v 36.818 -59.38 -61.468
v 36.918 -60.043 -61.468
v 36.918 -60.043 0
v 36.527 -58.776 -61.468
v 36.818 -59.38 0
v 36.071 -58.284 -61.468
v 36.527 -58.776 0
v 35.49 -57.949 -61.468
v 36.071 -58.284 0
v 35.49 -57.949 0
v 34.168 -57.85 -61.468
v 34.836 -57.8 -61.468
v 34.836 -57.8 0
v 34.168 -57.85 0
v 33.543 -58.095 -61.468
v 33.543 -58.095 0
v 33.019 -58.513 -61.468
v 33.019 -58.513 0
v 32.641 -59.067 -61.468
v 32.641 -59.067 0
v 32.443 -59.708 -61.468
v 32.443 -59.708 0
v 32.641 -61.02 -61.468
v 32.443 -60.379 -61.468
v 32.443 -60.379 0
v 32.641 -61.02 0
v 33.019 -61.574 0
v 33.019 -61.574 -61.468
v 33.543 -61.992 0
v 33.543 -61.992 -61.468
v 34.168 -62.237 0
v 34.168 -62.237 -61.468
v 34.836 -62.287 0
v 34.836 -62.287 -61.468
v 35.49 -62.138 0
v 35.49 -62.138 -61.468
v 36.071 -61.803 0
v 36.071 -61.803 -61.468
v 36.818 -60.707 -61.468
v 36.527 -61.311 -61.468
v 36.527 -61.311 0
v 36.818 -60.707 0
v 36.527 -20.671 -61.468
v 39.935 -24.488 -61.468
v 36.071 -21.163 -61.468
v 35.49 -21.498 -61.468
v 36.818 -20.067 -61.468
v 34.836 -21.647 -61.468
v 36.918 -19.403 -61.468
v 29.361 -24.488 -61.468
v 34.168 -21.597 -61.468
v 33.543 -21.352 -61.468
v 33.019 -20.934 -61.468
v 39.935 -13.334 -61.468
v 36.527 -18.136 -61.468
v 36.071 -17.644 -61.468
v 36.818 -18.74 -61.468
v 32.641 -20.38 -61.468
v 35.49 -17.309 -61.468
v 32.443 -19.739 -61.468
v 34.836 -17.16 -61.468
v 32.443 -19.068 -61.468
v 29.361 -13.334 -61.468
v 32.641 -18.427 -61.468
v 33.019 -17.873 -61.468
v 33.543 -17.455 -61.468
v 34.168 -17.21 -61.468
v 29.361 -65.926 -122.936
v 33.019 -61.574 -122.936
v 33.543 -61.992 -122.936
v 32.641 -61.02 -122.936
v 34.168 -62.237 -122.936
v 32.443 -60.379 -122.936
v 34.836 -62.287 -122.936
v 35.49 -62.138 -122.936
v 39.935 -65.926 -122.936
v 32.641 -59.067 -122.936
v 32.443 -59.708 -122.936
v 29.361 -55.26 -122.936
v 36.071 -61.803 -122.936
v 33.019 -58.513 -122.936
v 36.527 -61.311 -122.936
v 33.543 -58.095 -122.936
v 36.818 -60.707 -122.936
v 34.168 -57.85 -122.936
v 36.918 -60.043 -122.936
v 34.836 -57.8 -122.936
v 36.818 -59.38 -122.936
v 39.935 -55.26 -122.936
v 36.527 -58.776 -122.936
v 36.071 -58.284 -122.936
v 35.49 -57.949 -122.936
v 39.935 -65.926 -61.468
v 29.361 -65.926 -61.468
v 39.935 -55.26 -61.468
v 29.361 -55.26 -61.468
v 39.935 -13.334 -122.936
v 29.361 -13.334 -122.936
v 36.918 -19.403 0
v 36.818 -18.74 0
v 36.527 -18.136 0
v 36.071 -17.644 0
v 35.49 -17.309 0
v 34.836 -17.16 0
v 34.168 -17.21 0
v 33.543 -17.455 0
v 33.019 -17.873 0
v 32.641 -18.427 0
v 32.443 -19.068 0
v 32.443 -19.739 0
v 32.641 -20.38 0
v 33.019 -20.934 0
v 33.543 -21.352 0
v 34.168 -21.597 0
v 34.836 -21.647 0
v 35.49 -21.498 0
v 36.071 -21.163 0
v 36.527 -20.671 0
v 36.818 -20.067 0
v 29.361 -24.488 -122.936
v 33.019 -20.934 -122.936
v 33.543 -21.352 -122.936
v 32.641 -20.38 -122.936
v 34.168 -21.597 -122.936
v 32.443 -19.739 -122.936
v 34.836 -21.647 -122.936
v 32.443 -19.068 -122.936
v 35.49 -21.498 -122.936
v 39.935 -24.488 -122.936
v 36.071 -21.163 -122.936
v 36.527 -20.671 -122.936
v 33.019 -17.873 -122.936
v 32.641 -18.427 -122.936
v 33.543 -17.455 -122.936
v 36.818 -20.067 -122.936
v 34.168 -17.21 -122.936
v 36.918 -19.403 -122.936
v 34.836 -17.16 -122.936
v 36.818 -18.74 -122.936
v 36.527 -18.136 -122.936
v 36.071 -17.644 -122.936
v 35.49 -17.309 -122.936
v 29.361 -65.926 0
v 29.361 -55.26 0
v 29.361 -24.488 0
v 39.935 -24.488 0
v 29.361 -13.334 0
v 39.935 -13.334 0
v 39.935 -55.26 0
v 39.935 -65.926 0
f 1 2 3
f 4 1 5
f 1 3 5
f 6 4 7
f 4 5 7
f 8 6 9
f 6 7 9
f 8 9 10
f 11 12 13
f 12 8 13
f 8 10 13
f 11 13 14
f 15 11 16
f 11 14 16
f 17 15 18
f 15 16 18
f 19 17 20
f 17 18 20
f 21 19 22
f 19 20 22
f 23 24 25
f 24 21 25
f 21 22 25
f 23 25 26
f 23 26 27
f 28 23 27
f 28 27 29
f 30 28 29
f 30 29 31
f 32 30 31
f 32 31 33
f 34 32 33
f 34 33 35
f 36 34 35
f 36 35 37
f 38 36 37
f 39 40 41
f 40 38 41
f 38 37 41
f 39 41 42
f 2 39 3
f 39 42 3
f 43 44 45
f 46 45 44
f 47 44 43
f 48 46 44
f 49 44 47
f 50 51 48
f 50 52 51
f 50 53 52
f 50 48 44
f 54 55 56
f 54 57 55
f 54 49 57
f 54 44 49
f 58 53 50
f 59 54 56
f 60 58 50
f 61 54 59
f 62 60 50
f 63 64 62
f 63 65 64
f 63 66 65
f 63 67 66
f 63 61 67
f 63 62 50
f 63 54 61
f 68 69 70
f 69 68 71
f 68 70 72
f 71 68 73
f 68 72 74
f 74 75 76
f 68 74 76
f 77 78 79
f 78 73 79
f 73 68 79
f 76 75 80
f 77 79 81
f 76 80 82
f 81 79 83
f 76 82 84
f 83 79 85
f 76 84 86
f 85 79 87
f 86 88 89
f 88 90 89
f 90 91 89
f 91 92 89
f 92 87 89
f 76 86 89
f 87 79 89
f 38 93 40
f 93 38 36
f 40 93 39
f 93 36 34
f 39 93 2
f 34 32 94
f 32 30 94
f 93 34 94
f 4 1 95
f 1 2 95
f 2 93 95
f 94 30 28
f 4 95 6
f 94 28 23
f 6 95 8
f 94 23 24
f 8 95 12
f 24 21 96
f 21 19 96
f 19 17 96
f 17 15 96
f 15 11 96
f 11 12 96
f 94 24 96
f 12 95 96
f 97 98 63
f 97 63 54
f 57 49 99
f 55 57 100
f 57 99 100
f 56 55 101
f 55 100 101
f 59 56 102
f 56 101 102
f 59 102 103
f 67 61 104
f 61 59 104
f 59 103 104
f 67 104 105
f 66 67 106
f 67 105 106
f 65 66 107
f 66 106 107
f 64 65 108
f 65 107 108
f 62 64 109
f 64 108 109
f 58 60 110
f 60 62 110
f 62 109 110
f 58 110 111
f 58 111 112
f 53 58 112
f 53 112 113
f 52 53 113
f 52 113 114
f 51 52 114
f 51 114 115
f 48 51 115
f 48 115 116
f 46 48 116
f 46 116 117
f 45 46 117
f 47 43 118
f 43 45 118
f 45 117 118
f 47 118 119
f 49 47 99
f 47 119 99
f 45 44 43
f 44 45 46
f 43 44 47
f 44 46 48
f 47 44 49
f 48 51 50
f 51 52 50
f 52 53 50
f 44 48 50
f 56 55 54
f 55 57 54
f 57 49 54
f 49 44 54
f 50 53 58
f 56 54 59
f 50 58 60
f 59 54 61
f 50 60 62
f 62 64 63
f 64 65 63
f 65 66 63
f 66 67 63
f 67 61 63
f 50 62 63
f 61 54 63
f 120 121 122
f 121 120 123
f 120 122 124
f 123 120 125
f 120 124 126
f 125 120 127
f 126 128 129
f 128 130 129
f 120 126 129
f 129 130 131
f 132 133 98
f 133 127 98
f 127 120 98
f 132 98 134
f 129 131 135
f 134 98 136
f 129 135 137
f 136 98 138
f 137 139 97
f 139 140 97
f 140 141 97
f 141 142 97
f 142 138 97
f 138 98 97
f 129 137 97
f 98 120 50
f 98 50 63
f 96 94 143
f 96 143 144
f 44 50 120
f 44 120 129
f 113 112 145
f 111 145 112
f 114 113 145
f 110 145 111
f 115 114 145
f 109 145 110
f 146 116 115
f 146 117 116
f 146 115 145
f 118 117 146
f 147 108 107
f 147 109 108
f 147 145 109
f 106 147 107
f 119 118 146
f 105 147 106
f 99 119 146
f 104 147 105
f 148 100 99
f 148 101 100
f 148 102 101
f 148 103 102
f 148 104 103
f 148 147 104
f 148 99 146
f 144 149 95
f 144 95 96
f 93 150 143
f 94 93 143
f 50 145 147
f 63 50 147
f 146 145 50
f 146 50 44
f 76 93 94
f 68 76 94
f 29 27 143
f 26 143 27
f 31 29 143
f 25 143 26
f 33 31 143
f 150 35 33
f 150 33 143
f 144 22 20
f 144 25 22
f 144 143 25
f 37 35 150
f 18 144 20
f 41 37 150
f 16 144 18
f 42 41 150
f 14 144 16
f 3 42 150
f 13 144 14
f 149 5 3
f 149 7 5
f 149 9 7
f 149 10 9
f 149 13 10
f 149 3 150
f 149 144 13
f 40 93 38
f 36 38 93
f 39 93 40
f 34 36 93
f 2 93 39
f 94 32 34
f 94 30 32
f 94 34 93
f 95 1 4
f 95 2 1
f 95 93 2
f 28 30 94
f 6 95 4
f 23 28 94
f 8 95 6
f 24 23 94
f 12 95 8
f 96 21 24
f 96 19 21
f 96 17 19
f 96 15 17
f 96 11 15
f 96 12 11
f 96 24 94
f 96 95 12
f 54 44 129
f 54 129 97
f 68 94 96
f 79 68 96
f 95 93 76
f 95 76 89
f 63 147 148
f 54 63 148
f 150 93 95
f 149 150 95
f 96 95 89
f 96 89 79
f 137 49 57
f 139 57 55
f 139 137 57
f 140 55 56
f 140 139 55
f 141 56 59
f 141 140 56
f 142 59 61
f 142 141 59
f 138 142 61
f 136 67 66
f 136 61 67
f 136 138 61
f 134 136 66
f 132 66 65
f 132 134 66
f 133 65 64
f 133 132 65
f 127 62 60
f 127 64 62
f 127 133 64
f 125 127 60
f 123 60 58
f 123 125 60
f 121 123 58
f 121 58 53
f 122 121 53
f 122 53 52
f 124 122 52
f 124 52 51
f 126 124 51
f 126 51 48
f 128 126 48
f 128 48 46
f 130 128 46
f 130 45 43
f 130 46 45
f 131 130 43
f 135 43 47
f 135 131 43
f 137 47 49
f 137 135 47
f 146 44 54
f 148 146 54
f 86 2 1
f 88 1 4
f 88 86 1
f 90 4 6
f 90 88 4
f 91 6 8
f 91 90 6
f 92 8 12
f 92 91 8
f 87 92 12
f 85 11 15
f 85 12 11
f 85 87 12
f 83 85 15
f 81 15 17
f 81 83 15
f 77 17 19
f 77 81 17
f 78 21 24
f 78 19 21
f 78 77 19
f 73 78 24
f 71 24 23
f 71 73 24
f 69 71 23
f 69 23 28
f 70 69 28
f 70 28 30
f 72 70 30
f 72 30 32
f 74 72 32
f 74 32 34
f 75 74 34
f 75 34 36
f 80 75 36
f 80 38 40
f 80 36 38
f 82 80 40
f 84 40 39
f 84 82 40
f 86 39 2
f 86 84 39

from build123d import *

# Parameters (mm, degrees)
SKETCH1_W                = 16
SKETCH1_H                = 57.332
SKETCH1_R                = 2.25
BOSS_EXTRUDE1_DEPTH      = 12.7
BOSS_EXTRUDE3_DEPTH      = 48.768
BOSS_EXTRUDE3_DEPTH_BACK = 12.7
SKETCH4_W                = 10.573315132
SKETCH4_H                = 11.154301746
SKETCH4_R                = 2.25
SKETCH4_H_2              = 10.666438104
SKETCH5_W                = 10.573315132
SKETCH5_H                = 10.666438104
CUT_EXTRUDE1_DEPTH       = 47.752


with BuildPart() as part:
    # Sketch1 → Boss-Extrude1 (new body)
    with BuildSketch(Plane.XY):
        with Locations((34.668274257, -42)):
            Rectangle(SKETCH1_W, SKETCH1_H)
        with Locations((34.668274257, -19.403489859)):
            Circle(SKETCH1_R, mode=Mode.SUBTRACT)
        with Locations((34.668274257, -60.043489859)):
            Circle(SKETCH1_R, mode=Mode.SUBTRACT)
    extrude(amount=-BOSS_EXTRUDE1_DEPTH)

    # Sketch4 → Boss-Extrude3 (add, two sides: drawn at the far end of the back side and taken through both)
    # profile 1 of 2: a face of its own
    with BuildSketch(Plane(origin=(0, 0, -12.7), x_dir=(-1, 0, 0), z_dir=(0, 0, -1)).offset(-BOSS_EXTRUDE3_DEPTH_BACK)):
        with Locations((-34.64798409, -18.911150873)):
            Rectangle(SKETCH4_W, SKETCH4_H)
        with Locations(Location((-34.668274257, -19.403489859, 0), (0, 0, 180))):
            Circle(SKETCH4_R, mode=Mode.SUBTRACT)
    # profile 2 of 2: a face of its own
    with BuildSketch(Plane(origin=(0, 0, -12.7), x_dir=(-1, 0, 0), z_dir=(0, 0, -1)).offset(-BOSS_EXTRUDE3_DEPTH_BACK)):
        with Locations((-34.64798409, -60.593056671)):
            Rectangle(SKETCH4_W, SKETCH4_H_2)
        with Locations(Location((-34.668274257, -60.043489859, 0), (0, 0, 180))):
            Circle(SKETCH4_R, mode=Mode.SUBTRACT)
    extrude(amount=BOSS_EXTRUDE3_DEPTH + BOSS_EXTRUDE3_DEPTH_BACK)

    # Sketch5 → Cut-Extrude1 (cut)
    with BuildSketch(Plane(origin=(0, 0, -12.7), x_dir=(-1, 0, 0), z_dir=(0, 0, -1))):
        Polygon((-39.934641656, -13.334), (-42.668274257, -13.334), (-42.668274257, -70.666), (-26.668274257, -70.666), (-26.668274257, -13.334), (-29.361326524, -13.334), (-29.361326524, -24.488301746), (-39.934641656, -24.488301746), align=None)
        with Locations((-34.64798409, -60.593056671)):
            Rectangle(SKETCH5_W, SKETCH5_H, mode=Mode.SUBTRACT)
    extrude(amount=-CUT_EXTRUDE1_DEPTH, mode=Mode.SUBTRACT)


with BuildPart() as cut_extrude1_piece_1:
    # of the separate pieces the step leaves, piece 1, a body of its own (cut_extrude1_pieces)
    add(part.part.solids().sort_by_distance((29.361326524, -13.334, 0))[0])


with BuildPart() as cut_extrude1_piece_2:
    # of the separate pieces the step leaves, piece 2, a body of its own (cut_extrude1_pieces)
    add(part.part.solids().sort_by_distance((29.361326524, -65.926275723, 0))[0])


with BuildPart() as body_3:
    # Mirror3: mirrored copy
    add(cut_extrude1_piece_2.part.mirror(Plane(origin=(0, 0, -61.468), x_dir=(1, 0, 0), z_dir=(0, 0, -1))))


with BuildPart() as body_4:
    # Mirror3 2: mirrored copy
    add(cut_extrude1_piece_1.part.mirror(Plane(origin=(0, 0, -61.468), x_dir=(1, 0, 0), z_dir=(0, 0, -1))))


solid = Compound([cut_extrude1_piece_1.part, cut_extrude1_piece_2.part, body_3.part, body_4.part])
